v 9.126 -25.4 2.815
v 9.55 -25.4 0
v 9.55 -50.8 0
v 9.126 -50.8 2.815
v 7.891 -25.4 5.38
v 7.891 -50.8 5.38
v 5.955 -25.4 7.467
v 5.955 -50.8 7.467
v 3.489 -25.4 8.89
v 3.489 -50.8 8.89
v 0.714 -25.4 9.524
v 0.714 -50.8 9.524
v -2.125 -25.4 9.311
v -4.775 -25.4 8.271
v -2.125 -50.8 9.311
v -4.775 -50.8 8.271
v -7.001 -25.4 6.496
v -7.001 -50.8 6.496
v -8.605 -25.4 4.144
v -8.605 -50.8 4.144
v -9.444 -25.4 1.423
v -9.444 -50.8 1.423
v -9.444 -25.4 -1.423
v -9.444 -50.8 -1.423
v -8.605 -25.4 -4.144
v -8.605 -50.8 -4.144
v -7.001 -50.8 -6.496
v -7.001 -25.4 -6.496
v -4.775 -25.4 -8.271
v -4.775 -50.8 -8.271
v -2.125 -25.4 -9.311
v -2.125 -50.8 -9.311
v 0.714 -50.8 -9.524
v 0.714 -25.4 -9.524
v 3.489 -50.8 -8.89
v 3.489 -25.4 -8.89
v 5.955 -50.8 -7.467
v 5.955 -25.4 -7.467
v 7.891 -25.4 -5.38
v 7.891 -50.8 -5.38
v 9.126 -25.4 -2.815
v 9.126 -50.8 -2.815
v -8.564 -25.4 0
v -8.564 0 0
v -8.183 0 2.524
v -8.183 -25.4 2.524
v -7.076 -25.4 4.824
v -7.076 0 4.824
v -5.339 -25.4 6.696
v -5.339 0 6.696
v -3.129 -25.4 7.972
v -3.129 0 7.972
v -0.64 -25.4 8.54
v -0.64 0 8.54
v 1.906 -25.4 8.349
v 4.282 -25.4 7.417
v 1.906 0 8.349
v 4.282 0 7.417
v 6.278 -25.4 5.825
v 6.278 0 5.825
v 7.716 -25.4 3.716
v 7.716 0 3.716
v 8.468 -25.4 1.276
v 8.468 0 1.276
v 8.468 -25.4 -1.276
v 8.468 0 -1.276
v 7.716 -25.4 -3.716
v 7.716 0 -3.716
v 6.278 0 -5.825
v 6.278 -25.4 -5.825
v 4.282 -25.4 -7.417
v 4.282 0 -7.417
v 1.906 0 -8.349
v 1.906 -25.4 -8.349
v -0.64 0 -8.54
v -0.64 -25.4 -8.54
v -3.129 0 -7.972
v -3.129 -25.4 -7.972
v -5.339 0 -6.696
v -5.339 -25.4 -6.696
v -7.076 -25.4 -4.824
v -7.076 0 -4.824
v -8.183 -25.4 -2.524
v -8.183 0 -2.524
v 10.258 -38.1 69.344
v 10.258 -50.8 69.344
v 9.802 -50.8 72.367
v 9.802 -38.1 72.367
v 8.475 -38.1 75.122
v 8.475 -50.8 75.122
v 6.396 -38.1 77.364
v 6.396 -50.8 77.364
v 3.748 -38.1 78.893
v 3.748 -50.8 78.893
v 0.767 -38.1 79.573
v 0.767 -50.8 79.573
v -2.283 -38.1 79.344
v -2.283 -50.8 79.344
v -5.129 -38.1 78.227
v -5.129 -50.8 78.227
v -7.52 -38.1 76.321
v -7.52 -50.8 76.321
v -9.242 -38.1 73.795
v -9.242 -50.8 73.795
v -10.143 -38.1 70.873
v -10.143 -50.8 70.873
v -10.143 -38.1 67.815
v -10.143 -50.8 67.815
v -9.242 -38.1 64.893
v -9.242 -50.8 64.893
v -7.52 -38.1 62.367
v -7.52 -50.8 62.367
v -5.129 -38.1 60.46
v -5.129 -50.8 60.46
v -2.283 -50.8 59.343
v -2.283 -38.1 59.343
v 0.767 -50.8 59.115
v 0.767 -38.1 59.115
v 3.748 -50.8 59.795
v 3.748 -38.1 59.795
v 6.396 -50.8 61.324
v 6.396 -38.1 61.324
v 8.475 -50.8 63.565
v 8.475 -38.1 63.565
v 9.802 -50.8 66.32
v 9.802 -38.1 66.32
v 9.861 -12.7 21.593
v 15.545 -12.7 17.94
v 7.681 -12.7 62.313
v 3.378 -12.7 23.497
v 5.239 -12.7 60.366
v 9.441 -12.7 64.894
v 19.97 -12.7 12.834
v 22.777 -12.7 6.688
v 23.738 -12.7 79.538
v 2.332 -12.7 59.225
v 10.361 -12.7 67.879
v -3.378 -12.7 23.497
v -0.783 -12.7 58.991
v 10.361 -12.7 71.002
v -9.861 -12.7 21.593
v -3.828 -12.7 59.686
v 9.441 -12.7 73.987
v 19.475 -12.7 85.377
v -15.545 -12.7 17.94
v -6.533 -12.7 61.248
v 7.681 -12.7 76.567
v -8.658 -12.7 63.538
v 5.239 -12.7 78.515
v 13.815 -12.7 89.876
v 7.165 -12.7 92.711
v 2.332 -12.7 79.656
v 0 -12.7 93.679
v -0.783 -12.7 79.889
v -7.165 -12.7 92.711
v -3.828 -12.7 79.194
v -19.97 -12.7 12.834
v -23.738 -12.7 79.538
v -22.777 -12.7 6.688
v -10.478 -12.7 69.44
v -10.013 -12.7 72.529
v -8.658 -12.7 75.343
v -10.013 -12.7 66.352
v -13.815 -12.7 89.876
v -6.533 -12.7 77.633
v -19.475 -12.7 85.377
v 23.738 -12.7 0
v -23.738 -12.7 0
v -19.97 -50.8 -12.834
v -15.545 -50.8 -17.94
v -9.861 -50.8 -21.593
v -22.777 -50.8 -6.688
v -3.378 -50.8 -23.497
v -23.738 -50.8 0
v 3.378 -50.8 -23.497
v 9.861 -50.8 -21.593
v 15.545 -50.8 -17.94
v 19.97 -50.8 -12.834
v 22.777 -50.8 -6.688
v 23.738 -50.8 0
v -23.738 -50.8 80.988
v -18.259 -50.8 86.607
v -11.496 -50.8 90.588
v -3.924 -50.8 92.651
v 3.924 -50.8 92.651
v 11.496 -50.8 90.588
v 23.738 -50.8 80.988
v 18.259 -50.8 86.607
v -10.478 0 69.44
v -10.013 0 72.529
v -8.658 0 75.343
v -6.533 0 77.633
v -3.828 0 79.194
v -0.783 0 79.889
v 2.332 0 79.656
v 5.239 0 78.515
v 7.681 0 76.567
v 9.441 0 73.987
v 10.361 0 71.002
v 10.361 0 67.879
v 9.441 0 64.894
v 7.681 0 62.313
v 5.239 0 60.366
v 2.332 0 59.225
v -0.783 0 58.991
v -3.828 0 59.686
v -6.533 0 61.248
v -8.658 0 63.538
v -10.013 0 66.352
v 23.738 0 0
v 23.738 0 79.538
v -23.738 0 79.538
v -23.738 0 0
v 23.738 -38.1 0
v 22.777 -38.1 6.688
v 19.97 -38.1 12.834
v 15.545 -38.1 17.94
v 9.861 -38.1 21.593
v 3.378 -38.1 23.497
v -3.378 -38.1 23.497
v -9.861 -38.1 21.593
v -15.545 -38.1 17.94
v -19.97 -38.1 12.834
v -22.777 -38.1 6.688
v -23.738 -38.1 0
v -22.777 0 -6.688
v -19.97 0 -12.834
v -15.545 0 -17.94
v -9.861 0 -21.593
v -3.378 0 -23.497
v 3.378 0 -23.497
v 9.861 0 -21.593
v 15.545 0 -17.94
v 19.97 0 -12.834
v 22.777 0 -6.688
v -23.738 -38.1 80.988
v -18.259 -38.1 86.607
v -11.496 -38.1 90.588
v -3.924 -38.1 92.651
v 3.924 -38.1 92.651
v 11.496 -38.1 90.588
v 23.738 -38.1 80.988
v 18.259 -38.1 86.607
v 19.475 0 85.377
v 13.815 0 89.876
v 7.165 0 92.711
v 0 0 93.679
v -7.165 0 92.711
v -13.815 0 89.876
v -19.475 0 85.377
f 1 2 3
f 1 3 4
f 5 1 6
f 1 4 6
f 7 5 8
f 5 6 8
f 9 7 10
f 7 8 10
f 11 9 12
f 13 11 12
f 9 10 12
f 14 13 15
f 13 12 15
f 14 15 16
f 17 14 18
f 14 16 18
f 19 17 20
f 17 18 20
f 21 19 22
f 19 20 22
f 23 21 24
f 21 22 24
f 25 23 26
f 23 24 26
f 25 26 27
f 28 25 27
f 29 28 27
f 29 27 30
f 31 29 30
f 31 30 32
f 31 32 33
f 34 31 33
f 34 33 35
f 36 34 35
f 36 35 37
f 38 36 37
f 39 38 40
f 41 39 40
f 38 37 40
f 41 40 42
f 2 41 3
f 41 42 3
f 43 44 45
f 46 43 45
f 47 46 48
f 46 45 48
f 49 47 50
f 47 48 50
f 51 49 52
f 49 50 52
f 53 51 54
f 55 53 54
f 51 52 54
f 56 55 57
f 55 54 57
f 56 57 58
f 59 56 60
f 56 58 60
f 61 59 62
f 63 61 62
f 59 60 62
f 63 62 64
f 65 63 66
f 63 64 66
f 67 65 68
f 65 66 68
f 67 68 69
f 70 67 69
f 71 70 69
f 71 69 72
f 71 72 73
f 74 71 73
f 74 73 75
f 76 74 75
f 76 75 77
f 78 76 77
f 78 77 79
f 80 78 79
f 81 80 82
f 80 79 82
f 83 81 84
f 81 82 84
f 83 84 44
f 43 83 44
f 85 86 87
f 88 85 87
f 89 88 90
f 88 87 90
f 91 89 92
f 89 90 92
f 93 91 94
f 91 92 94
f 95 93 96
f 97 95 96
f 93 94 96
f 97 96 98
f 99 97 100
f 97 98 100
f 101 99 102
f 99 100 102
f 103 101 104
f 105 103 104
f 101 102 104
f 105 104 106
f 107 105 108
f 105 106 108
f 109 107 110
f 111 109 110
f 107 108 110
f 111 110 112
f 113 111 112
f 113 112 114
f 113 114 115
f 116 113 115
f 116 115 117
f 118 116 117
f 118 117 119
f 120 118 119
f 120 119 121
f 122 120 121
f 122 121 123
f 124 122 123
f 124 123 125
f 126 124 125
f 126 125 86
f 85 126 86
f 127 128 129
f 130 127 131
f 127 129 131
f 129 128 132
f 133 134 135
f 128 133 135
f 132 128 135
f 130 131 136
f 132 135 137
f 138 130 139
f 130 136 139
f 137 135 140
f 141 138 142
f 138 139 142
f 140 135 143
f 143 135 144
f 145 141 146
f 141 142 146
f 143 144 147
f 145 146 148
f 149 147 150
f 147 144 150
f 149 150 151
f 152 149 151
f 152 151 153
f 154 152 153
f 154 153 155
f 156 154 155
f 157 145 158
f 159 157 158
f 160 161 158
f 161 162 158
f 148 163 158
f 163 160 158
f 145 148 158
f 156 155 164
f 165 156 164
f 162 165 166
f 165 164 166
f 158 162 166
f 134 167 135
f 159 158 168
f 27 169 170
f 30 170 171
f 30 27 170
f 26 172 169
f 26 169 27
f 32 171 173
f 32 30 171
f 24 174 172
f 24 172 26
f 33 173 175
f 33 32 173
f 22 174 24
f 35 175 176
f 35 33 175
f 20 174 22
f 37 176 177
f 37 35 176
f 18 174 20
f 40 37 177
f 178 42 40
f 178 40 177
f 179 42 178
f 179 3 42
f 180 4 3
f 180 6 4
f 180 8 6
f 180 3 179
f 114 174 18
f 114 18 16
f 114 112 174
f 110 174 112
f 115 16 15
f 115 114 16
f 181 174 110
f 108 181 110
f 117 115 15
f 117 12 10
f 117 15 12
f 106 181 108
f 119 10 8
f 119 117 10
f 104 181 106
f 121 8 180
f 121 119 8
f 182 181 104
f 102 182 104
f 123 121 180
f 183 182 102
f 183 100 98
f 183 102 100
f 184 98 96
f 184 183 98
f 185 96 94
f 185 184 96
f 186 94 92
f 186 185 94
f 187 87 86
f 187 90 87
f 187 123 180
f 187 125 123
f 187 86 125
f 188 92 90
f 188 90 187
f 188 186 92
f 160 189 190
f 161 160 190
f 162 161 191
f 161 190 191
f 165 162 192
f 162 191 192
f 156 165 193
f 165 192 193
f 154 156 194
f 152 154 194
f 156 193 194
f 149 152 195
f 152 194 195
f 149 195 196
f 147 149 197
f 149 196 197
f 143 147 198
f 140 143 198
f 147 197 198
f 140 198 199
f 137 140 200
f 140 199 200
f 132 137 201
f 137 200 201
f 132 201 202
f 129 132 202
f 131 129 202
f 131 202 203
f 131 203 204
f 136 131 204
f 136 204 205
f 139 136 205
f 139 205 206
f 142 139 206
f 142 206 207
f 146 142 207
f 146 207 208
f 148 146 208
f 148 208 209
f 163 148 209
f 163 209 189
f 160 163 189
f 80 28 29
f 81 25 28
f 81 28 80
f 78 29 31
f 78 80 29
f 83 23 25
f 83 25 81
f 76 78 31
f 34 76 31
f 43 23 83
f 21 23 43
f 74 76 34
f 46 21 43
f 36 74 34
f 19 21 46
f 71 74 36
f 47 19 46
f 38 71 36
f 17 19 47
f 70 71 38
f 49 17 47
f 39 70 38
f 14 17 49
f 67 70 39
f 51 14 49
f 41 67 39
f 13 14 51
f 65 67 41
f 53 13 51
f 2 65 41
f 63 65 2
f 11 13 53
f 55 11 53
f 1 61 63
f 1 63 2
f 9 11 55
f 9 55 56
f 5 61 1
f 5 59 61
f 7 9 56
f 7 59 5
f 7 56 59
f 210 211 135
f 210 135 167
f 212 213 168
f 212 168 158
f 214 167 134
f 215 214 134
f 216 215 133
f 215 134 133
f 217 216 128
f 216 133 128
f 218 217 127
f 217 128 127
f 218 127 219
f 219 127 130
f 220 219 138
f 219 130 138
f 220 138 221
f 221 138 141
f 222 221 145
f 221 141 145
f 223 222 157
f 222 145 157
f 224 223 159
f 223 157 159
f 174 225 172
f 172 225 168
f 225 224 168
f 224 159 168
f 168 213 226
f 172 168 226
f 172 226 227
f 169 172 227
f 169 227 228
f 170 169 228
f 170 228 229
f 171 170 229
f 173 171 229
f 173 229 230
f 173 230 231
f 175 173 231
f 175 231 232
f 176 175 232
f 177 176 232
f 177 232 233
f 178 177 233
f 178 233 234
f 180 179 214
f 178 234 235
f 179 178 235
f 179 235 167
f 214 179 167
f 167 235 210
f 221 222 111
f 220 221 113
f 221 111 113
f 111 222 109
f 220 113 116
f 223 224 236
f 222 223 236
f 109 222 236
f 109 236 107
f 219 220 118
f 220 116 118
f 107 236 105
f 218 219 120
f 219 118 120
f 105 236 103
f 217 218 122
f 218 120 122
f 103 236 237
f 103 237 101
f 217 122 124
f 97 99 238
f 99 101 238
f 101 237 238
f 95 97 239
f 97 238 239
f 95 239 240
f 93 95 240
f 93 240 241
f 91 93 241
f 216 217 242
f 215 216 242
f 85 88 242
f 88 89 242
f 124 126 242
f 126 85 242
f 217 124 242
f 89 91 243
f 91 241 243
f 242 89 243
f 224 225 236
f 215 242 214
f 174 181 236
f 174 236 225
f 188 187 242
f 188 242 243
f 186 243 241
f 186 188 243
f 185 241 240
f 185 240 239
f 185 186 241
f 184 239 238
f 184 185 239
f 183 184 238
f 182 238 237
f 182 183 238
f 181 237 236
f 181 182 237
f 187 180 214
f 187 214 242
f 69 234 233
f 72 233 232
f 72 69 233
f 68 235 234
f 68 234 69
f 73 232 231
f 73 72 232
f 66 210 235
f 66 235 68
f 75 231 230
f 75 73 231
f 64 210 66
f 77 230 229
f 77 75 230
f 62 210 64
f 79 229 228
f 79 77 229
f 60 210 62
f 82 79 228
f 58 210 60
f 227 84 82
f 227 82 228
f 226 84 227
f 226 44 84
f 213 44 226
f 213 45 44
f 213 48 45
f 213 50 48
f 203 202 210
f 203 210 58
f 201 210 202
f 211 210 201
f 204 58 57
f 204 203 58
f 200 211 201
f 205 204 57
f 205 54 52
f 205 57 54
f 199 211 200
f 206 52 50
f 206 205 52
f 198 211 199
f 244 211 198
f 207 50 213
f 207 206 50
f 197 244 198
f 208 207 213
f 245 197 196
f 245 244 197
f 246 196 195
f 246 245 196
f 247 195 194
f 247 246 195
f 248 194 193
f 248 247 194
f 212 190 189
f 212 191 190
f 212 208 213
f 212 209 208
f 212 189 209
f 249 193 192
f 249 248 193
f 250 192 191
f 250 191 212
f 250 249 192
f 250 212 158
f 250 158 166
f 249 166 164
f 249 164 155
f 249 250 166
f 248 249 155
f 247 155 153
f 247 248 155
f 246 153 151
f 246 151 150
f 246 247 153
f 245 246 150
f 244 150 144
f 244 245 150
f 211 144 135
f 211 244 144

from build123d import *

# Parameters (mm, degrees)
F0_R      = 23.7382132345
F1_DEPTH  = 50.8
F2_R      = 9.5504796537
F3_DEPTH  = 25.4
F4_R      = 8.5638867121
F5_DEPTH  = 25.4
F7_DEPTH  = 12.7
F9_DEPTH  = 12.7
F10_R     = 10.4784811222
F11_DEPTH = 25.4
F12_R     = 10.2578484405
F13_DEPTH = 25.4


with BuildPart() as f1:
    # F0 (on Front) → F1 (new body)
    with BuildSketch(Plane.XZ):
        Circle(F0_R)
    extrude(amount=F1_DEPTH)

    # F2 (on face) → F3 (cut)
    with BuildSketch(Plane.XZ.offset(50.8)):
        Circle(F2_R)
    extrude(amount=-F3_DEPTH, mode=Mode.SUBTRACT)

    # F4 (on face) → F5 (cut)
    with BuildSketch(Plane(origin=(0, 0, 0), x_dir=(-1, 0, 0), z_dir=(0, 1, 0))):
        Circle(F4_R)
    extrude(amount=-F5_DEPTH, mode=Mode.SUBTRACT)

    # F6 (on face) → F7 (join)
    with BuildSketch(Plane.XZ.offset(50.8)):
        with BuildLine():
            Line((-23.7382132345, 80.9877067804), (-23.7382132345, 0))
            ThreePointArc((-23.7382132345, 0), (0, 23.7382132345), (23.7382132345, 0))
            Line((23.7382132345, 0), (23.7382132345, 80.9877067804))
            ThreePointArc((23.7382132345, 80.9877067804), (0, 92.9128323783), (-23.7382132345, 80.9877067804))
        make_face()
    extrude(amount=-F7_DEPTH)

    # F8 (on face) → F9 (join)
    with BuildSketch(Plane(origin=(0, 0, 0), x_dir=(-1, 0, 0), z_dir=(0, 1, 0))):
        with BuildLine():
            Line((-23.7382132345, 79.5382484794), (-23.7382132345, 0))
            ThreePointArc((-23.7382132345, 0), (0, 23.7382132345), (23.7382132345, 0))
            Line((23.7382132345, 0), (23.7382132345, 79.5382484794))
            ThreePointArc((23.7382132345, 79.5382484794), (0, 93.6788109579), (-23.7382132345, 79.5382484794))
        make_face()
    extrude(amount=-F9_DEPTH)

    # F10 (on face) → F11 (cut)
    with BuildSketch(Plane(origin=(0, 0, 0), x_dir=(-1, 0, 0), z_dir=(0, 1, 0))):
        with Locations((0, 69.4402828813)):
            Circle(F10_R)
    extrude(amount=-F11_DEPTH, mode=Mode.SUBTRACT)

    # F12 (on face) → F13 (cut)
    with BuildSketch(Plane.XZ.offset(50.8)):
        with Locations((0, 69.3438276649)):
            Circle(F12_R)
    extrude(amount=-F13_DEPTH, mode=Mode.SUBTRACT)


solid = f1.part
